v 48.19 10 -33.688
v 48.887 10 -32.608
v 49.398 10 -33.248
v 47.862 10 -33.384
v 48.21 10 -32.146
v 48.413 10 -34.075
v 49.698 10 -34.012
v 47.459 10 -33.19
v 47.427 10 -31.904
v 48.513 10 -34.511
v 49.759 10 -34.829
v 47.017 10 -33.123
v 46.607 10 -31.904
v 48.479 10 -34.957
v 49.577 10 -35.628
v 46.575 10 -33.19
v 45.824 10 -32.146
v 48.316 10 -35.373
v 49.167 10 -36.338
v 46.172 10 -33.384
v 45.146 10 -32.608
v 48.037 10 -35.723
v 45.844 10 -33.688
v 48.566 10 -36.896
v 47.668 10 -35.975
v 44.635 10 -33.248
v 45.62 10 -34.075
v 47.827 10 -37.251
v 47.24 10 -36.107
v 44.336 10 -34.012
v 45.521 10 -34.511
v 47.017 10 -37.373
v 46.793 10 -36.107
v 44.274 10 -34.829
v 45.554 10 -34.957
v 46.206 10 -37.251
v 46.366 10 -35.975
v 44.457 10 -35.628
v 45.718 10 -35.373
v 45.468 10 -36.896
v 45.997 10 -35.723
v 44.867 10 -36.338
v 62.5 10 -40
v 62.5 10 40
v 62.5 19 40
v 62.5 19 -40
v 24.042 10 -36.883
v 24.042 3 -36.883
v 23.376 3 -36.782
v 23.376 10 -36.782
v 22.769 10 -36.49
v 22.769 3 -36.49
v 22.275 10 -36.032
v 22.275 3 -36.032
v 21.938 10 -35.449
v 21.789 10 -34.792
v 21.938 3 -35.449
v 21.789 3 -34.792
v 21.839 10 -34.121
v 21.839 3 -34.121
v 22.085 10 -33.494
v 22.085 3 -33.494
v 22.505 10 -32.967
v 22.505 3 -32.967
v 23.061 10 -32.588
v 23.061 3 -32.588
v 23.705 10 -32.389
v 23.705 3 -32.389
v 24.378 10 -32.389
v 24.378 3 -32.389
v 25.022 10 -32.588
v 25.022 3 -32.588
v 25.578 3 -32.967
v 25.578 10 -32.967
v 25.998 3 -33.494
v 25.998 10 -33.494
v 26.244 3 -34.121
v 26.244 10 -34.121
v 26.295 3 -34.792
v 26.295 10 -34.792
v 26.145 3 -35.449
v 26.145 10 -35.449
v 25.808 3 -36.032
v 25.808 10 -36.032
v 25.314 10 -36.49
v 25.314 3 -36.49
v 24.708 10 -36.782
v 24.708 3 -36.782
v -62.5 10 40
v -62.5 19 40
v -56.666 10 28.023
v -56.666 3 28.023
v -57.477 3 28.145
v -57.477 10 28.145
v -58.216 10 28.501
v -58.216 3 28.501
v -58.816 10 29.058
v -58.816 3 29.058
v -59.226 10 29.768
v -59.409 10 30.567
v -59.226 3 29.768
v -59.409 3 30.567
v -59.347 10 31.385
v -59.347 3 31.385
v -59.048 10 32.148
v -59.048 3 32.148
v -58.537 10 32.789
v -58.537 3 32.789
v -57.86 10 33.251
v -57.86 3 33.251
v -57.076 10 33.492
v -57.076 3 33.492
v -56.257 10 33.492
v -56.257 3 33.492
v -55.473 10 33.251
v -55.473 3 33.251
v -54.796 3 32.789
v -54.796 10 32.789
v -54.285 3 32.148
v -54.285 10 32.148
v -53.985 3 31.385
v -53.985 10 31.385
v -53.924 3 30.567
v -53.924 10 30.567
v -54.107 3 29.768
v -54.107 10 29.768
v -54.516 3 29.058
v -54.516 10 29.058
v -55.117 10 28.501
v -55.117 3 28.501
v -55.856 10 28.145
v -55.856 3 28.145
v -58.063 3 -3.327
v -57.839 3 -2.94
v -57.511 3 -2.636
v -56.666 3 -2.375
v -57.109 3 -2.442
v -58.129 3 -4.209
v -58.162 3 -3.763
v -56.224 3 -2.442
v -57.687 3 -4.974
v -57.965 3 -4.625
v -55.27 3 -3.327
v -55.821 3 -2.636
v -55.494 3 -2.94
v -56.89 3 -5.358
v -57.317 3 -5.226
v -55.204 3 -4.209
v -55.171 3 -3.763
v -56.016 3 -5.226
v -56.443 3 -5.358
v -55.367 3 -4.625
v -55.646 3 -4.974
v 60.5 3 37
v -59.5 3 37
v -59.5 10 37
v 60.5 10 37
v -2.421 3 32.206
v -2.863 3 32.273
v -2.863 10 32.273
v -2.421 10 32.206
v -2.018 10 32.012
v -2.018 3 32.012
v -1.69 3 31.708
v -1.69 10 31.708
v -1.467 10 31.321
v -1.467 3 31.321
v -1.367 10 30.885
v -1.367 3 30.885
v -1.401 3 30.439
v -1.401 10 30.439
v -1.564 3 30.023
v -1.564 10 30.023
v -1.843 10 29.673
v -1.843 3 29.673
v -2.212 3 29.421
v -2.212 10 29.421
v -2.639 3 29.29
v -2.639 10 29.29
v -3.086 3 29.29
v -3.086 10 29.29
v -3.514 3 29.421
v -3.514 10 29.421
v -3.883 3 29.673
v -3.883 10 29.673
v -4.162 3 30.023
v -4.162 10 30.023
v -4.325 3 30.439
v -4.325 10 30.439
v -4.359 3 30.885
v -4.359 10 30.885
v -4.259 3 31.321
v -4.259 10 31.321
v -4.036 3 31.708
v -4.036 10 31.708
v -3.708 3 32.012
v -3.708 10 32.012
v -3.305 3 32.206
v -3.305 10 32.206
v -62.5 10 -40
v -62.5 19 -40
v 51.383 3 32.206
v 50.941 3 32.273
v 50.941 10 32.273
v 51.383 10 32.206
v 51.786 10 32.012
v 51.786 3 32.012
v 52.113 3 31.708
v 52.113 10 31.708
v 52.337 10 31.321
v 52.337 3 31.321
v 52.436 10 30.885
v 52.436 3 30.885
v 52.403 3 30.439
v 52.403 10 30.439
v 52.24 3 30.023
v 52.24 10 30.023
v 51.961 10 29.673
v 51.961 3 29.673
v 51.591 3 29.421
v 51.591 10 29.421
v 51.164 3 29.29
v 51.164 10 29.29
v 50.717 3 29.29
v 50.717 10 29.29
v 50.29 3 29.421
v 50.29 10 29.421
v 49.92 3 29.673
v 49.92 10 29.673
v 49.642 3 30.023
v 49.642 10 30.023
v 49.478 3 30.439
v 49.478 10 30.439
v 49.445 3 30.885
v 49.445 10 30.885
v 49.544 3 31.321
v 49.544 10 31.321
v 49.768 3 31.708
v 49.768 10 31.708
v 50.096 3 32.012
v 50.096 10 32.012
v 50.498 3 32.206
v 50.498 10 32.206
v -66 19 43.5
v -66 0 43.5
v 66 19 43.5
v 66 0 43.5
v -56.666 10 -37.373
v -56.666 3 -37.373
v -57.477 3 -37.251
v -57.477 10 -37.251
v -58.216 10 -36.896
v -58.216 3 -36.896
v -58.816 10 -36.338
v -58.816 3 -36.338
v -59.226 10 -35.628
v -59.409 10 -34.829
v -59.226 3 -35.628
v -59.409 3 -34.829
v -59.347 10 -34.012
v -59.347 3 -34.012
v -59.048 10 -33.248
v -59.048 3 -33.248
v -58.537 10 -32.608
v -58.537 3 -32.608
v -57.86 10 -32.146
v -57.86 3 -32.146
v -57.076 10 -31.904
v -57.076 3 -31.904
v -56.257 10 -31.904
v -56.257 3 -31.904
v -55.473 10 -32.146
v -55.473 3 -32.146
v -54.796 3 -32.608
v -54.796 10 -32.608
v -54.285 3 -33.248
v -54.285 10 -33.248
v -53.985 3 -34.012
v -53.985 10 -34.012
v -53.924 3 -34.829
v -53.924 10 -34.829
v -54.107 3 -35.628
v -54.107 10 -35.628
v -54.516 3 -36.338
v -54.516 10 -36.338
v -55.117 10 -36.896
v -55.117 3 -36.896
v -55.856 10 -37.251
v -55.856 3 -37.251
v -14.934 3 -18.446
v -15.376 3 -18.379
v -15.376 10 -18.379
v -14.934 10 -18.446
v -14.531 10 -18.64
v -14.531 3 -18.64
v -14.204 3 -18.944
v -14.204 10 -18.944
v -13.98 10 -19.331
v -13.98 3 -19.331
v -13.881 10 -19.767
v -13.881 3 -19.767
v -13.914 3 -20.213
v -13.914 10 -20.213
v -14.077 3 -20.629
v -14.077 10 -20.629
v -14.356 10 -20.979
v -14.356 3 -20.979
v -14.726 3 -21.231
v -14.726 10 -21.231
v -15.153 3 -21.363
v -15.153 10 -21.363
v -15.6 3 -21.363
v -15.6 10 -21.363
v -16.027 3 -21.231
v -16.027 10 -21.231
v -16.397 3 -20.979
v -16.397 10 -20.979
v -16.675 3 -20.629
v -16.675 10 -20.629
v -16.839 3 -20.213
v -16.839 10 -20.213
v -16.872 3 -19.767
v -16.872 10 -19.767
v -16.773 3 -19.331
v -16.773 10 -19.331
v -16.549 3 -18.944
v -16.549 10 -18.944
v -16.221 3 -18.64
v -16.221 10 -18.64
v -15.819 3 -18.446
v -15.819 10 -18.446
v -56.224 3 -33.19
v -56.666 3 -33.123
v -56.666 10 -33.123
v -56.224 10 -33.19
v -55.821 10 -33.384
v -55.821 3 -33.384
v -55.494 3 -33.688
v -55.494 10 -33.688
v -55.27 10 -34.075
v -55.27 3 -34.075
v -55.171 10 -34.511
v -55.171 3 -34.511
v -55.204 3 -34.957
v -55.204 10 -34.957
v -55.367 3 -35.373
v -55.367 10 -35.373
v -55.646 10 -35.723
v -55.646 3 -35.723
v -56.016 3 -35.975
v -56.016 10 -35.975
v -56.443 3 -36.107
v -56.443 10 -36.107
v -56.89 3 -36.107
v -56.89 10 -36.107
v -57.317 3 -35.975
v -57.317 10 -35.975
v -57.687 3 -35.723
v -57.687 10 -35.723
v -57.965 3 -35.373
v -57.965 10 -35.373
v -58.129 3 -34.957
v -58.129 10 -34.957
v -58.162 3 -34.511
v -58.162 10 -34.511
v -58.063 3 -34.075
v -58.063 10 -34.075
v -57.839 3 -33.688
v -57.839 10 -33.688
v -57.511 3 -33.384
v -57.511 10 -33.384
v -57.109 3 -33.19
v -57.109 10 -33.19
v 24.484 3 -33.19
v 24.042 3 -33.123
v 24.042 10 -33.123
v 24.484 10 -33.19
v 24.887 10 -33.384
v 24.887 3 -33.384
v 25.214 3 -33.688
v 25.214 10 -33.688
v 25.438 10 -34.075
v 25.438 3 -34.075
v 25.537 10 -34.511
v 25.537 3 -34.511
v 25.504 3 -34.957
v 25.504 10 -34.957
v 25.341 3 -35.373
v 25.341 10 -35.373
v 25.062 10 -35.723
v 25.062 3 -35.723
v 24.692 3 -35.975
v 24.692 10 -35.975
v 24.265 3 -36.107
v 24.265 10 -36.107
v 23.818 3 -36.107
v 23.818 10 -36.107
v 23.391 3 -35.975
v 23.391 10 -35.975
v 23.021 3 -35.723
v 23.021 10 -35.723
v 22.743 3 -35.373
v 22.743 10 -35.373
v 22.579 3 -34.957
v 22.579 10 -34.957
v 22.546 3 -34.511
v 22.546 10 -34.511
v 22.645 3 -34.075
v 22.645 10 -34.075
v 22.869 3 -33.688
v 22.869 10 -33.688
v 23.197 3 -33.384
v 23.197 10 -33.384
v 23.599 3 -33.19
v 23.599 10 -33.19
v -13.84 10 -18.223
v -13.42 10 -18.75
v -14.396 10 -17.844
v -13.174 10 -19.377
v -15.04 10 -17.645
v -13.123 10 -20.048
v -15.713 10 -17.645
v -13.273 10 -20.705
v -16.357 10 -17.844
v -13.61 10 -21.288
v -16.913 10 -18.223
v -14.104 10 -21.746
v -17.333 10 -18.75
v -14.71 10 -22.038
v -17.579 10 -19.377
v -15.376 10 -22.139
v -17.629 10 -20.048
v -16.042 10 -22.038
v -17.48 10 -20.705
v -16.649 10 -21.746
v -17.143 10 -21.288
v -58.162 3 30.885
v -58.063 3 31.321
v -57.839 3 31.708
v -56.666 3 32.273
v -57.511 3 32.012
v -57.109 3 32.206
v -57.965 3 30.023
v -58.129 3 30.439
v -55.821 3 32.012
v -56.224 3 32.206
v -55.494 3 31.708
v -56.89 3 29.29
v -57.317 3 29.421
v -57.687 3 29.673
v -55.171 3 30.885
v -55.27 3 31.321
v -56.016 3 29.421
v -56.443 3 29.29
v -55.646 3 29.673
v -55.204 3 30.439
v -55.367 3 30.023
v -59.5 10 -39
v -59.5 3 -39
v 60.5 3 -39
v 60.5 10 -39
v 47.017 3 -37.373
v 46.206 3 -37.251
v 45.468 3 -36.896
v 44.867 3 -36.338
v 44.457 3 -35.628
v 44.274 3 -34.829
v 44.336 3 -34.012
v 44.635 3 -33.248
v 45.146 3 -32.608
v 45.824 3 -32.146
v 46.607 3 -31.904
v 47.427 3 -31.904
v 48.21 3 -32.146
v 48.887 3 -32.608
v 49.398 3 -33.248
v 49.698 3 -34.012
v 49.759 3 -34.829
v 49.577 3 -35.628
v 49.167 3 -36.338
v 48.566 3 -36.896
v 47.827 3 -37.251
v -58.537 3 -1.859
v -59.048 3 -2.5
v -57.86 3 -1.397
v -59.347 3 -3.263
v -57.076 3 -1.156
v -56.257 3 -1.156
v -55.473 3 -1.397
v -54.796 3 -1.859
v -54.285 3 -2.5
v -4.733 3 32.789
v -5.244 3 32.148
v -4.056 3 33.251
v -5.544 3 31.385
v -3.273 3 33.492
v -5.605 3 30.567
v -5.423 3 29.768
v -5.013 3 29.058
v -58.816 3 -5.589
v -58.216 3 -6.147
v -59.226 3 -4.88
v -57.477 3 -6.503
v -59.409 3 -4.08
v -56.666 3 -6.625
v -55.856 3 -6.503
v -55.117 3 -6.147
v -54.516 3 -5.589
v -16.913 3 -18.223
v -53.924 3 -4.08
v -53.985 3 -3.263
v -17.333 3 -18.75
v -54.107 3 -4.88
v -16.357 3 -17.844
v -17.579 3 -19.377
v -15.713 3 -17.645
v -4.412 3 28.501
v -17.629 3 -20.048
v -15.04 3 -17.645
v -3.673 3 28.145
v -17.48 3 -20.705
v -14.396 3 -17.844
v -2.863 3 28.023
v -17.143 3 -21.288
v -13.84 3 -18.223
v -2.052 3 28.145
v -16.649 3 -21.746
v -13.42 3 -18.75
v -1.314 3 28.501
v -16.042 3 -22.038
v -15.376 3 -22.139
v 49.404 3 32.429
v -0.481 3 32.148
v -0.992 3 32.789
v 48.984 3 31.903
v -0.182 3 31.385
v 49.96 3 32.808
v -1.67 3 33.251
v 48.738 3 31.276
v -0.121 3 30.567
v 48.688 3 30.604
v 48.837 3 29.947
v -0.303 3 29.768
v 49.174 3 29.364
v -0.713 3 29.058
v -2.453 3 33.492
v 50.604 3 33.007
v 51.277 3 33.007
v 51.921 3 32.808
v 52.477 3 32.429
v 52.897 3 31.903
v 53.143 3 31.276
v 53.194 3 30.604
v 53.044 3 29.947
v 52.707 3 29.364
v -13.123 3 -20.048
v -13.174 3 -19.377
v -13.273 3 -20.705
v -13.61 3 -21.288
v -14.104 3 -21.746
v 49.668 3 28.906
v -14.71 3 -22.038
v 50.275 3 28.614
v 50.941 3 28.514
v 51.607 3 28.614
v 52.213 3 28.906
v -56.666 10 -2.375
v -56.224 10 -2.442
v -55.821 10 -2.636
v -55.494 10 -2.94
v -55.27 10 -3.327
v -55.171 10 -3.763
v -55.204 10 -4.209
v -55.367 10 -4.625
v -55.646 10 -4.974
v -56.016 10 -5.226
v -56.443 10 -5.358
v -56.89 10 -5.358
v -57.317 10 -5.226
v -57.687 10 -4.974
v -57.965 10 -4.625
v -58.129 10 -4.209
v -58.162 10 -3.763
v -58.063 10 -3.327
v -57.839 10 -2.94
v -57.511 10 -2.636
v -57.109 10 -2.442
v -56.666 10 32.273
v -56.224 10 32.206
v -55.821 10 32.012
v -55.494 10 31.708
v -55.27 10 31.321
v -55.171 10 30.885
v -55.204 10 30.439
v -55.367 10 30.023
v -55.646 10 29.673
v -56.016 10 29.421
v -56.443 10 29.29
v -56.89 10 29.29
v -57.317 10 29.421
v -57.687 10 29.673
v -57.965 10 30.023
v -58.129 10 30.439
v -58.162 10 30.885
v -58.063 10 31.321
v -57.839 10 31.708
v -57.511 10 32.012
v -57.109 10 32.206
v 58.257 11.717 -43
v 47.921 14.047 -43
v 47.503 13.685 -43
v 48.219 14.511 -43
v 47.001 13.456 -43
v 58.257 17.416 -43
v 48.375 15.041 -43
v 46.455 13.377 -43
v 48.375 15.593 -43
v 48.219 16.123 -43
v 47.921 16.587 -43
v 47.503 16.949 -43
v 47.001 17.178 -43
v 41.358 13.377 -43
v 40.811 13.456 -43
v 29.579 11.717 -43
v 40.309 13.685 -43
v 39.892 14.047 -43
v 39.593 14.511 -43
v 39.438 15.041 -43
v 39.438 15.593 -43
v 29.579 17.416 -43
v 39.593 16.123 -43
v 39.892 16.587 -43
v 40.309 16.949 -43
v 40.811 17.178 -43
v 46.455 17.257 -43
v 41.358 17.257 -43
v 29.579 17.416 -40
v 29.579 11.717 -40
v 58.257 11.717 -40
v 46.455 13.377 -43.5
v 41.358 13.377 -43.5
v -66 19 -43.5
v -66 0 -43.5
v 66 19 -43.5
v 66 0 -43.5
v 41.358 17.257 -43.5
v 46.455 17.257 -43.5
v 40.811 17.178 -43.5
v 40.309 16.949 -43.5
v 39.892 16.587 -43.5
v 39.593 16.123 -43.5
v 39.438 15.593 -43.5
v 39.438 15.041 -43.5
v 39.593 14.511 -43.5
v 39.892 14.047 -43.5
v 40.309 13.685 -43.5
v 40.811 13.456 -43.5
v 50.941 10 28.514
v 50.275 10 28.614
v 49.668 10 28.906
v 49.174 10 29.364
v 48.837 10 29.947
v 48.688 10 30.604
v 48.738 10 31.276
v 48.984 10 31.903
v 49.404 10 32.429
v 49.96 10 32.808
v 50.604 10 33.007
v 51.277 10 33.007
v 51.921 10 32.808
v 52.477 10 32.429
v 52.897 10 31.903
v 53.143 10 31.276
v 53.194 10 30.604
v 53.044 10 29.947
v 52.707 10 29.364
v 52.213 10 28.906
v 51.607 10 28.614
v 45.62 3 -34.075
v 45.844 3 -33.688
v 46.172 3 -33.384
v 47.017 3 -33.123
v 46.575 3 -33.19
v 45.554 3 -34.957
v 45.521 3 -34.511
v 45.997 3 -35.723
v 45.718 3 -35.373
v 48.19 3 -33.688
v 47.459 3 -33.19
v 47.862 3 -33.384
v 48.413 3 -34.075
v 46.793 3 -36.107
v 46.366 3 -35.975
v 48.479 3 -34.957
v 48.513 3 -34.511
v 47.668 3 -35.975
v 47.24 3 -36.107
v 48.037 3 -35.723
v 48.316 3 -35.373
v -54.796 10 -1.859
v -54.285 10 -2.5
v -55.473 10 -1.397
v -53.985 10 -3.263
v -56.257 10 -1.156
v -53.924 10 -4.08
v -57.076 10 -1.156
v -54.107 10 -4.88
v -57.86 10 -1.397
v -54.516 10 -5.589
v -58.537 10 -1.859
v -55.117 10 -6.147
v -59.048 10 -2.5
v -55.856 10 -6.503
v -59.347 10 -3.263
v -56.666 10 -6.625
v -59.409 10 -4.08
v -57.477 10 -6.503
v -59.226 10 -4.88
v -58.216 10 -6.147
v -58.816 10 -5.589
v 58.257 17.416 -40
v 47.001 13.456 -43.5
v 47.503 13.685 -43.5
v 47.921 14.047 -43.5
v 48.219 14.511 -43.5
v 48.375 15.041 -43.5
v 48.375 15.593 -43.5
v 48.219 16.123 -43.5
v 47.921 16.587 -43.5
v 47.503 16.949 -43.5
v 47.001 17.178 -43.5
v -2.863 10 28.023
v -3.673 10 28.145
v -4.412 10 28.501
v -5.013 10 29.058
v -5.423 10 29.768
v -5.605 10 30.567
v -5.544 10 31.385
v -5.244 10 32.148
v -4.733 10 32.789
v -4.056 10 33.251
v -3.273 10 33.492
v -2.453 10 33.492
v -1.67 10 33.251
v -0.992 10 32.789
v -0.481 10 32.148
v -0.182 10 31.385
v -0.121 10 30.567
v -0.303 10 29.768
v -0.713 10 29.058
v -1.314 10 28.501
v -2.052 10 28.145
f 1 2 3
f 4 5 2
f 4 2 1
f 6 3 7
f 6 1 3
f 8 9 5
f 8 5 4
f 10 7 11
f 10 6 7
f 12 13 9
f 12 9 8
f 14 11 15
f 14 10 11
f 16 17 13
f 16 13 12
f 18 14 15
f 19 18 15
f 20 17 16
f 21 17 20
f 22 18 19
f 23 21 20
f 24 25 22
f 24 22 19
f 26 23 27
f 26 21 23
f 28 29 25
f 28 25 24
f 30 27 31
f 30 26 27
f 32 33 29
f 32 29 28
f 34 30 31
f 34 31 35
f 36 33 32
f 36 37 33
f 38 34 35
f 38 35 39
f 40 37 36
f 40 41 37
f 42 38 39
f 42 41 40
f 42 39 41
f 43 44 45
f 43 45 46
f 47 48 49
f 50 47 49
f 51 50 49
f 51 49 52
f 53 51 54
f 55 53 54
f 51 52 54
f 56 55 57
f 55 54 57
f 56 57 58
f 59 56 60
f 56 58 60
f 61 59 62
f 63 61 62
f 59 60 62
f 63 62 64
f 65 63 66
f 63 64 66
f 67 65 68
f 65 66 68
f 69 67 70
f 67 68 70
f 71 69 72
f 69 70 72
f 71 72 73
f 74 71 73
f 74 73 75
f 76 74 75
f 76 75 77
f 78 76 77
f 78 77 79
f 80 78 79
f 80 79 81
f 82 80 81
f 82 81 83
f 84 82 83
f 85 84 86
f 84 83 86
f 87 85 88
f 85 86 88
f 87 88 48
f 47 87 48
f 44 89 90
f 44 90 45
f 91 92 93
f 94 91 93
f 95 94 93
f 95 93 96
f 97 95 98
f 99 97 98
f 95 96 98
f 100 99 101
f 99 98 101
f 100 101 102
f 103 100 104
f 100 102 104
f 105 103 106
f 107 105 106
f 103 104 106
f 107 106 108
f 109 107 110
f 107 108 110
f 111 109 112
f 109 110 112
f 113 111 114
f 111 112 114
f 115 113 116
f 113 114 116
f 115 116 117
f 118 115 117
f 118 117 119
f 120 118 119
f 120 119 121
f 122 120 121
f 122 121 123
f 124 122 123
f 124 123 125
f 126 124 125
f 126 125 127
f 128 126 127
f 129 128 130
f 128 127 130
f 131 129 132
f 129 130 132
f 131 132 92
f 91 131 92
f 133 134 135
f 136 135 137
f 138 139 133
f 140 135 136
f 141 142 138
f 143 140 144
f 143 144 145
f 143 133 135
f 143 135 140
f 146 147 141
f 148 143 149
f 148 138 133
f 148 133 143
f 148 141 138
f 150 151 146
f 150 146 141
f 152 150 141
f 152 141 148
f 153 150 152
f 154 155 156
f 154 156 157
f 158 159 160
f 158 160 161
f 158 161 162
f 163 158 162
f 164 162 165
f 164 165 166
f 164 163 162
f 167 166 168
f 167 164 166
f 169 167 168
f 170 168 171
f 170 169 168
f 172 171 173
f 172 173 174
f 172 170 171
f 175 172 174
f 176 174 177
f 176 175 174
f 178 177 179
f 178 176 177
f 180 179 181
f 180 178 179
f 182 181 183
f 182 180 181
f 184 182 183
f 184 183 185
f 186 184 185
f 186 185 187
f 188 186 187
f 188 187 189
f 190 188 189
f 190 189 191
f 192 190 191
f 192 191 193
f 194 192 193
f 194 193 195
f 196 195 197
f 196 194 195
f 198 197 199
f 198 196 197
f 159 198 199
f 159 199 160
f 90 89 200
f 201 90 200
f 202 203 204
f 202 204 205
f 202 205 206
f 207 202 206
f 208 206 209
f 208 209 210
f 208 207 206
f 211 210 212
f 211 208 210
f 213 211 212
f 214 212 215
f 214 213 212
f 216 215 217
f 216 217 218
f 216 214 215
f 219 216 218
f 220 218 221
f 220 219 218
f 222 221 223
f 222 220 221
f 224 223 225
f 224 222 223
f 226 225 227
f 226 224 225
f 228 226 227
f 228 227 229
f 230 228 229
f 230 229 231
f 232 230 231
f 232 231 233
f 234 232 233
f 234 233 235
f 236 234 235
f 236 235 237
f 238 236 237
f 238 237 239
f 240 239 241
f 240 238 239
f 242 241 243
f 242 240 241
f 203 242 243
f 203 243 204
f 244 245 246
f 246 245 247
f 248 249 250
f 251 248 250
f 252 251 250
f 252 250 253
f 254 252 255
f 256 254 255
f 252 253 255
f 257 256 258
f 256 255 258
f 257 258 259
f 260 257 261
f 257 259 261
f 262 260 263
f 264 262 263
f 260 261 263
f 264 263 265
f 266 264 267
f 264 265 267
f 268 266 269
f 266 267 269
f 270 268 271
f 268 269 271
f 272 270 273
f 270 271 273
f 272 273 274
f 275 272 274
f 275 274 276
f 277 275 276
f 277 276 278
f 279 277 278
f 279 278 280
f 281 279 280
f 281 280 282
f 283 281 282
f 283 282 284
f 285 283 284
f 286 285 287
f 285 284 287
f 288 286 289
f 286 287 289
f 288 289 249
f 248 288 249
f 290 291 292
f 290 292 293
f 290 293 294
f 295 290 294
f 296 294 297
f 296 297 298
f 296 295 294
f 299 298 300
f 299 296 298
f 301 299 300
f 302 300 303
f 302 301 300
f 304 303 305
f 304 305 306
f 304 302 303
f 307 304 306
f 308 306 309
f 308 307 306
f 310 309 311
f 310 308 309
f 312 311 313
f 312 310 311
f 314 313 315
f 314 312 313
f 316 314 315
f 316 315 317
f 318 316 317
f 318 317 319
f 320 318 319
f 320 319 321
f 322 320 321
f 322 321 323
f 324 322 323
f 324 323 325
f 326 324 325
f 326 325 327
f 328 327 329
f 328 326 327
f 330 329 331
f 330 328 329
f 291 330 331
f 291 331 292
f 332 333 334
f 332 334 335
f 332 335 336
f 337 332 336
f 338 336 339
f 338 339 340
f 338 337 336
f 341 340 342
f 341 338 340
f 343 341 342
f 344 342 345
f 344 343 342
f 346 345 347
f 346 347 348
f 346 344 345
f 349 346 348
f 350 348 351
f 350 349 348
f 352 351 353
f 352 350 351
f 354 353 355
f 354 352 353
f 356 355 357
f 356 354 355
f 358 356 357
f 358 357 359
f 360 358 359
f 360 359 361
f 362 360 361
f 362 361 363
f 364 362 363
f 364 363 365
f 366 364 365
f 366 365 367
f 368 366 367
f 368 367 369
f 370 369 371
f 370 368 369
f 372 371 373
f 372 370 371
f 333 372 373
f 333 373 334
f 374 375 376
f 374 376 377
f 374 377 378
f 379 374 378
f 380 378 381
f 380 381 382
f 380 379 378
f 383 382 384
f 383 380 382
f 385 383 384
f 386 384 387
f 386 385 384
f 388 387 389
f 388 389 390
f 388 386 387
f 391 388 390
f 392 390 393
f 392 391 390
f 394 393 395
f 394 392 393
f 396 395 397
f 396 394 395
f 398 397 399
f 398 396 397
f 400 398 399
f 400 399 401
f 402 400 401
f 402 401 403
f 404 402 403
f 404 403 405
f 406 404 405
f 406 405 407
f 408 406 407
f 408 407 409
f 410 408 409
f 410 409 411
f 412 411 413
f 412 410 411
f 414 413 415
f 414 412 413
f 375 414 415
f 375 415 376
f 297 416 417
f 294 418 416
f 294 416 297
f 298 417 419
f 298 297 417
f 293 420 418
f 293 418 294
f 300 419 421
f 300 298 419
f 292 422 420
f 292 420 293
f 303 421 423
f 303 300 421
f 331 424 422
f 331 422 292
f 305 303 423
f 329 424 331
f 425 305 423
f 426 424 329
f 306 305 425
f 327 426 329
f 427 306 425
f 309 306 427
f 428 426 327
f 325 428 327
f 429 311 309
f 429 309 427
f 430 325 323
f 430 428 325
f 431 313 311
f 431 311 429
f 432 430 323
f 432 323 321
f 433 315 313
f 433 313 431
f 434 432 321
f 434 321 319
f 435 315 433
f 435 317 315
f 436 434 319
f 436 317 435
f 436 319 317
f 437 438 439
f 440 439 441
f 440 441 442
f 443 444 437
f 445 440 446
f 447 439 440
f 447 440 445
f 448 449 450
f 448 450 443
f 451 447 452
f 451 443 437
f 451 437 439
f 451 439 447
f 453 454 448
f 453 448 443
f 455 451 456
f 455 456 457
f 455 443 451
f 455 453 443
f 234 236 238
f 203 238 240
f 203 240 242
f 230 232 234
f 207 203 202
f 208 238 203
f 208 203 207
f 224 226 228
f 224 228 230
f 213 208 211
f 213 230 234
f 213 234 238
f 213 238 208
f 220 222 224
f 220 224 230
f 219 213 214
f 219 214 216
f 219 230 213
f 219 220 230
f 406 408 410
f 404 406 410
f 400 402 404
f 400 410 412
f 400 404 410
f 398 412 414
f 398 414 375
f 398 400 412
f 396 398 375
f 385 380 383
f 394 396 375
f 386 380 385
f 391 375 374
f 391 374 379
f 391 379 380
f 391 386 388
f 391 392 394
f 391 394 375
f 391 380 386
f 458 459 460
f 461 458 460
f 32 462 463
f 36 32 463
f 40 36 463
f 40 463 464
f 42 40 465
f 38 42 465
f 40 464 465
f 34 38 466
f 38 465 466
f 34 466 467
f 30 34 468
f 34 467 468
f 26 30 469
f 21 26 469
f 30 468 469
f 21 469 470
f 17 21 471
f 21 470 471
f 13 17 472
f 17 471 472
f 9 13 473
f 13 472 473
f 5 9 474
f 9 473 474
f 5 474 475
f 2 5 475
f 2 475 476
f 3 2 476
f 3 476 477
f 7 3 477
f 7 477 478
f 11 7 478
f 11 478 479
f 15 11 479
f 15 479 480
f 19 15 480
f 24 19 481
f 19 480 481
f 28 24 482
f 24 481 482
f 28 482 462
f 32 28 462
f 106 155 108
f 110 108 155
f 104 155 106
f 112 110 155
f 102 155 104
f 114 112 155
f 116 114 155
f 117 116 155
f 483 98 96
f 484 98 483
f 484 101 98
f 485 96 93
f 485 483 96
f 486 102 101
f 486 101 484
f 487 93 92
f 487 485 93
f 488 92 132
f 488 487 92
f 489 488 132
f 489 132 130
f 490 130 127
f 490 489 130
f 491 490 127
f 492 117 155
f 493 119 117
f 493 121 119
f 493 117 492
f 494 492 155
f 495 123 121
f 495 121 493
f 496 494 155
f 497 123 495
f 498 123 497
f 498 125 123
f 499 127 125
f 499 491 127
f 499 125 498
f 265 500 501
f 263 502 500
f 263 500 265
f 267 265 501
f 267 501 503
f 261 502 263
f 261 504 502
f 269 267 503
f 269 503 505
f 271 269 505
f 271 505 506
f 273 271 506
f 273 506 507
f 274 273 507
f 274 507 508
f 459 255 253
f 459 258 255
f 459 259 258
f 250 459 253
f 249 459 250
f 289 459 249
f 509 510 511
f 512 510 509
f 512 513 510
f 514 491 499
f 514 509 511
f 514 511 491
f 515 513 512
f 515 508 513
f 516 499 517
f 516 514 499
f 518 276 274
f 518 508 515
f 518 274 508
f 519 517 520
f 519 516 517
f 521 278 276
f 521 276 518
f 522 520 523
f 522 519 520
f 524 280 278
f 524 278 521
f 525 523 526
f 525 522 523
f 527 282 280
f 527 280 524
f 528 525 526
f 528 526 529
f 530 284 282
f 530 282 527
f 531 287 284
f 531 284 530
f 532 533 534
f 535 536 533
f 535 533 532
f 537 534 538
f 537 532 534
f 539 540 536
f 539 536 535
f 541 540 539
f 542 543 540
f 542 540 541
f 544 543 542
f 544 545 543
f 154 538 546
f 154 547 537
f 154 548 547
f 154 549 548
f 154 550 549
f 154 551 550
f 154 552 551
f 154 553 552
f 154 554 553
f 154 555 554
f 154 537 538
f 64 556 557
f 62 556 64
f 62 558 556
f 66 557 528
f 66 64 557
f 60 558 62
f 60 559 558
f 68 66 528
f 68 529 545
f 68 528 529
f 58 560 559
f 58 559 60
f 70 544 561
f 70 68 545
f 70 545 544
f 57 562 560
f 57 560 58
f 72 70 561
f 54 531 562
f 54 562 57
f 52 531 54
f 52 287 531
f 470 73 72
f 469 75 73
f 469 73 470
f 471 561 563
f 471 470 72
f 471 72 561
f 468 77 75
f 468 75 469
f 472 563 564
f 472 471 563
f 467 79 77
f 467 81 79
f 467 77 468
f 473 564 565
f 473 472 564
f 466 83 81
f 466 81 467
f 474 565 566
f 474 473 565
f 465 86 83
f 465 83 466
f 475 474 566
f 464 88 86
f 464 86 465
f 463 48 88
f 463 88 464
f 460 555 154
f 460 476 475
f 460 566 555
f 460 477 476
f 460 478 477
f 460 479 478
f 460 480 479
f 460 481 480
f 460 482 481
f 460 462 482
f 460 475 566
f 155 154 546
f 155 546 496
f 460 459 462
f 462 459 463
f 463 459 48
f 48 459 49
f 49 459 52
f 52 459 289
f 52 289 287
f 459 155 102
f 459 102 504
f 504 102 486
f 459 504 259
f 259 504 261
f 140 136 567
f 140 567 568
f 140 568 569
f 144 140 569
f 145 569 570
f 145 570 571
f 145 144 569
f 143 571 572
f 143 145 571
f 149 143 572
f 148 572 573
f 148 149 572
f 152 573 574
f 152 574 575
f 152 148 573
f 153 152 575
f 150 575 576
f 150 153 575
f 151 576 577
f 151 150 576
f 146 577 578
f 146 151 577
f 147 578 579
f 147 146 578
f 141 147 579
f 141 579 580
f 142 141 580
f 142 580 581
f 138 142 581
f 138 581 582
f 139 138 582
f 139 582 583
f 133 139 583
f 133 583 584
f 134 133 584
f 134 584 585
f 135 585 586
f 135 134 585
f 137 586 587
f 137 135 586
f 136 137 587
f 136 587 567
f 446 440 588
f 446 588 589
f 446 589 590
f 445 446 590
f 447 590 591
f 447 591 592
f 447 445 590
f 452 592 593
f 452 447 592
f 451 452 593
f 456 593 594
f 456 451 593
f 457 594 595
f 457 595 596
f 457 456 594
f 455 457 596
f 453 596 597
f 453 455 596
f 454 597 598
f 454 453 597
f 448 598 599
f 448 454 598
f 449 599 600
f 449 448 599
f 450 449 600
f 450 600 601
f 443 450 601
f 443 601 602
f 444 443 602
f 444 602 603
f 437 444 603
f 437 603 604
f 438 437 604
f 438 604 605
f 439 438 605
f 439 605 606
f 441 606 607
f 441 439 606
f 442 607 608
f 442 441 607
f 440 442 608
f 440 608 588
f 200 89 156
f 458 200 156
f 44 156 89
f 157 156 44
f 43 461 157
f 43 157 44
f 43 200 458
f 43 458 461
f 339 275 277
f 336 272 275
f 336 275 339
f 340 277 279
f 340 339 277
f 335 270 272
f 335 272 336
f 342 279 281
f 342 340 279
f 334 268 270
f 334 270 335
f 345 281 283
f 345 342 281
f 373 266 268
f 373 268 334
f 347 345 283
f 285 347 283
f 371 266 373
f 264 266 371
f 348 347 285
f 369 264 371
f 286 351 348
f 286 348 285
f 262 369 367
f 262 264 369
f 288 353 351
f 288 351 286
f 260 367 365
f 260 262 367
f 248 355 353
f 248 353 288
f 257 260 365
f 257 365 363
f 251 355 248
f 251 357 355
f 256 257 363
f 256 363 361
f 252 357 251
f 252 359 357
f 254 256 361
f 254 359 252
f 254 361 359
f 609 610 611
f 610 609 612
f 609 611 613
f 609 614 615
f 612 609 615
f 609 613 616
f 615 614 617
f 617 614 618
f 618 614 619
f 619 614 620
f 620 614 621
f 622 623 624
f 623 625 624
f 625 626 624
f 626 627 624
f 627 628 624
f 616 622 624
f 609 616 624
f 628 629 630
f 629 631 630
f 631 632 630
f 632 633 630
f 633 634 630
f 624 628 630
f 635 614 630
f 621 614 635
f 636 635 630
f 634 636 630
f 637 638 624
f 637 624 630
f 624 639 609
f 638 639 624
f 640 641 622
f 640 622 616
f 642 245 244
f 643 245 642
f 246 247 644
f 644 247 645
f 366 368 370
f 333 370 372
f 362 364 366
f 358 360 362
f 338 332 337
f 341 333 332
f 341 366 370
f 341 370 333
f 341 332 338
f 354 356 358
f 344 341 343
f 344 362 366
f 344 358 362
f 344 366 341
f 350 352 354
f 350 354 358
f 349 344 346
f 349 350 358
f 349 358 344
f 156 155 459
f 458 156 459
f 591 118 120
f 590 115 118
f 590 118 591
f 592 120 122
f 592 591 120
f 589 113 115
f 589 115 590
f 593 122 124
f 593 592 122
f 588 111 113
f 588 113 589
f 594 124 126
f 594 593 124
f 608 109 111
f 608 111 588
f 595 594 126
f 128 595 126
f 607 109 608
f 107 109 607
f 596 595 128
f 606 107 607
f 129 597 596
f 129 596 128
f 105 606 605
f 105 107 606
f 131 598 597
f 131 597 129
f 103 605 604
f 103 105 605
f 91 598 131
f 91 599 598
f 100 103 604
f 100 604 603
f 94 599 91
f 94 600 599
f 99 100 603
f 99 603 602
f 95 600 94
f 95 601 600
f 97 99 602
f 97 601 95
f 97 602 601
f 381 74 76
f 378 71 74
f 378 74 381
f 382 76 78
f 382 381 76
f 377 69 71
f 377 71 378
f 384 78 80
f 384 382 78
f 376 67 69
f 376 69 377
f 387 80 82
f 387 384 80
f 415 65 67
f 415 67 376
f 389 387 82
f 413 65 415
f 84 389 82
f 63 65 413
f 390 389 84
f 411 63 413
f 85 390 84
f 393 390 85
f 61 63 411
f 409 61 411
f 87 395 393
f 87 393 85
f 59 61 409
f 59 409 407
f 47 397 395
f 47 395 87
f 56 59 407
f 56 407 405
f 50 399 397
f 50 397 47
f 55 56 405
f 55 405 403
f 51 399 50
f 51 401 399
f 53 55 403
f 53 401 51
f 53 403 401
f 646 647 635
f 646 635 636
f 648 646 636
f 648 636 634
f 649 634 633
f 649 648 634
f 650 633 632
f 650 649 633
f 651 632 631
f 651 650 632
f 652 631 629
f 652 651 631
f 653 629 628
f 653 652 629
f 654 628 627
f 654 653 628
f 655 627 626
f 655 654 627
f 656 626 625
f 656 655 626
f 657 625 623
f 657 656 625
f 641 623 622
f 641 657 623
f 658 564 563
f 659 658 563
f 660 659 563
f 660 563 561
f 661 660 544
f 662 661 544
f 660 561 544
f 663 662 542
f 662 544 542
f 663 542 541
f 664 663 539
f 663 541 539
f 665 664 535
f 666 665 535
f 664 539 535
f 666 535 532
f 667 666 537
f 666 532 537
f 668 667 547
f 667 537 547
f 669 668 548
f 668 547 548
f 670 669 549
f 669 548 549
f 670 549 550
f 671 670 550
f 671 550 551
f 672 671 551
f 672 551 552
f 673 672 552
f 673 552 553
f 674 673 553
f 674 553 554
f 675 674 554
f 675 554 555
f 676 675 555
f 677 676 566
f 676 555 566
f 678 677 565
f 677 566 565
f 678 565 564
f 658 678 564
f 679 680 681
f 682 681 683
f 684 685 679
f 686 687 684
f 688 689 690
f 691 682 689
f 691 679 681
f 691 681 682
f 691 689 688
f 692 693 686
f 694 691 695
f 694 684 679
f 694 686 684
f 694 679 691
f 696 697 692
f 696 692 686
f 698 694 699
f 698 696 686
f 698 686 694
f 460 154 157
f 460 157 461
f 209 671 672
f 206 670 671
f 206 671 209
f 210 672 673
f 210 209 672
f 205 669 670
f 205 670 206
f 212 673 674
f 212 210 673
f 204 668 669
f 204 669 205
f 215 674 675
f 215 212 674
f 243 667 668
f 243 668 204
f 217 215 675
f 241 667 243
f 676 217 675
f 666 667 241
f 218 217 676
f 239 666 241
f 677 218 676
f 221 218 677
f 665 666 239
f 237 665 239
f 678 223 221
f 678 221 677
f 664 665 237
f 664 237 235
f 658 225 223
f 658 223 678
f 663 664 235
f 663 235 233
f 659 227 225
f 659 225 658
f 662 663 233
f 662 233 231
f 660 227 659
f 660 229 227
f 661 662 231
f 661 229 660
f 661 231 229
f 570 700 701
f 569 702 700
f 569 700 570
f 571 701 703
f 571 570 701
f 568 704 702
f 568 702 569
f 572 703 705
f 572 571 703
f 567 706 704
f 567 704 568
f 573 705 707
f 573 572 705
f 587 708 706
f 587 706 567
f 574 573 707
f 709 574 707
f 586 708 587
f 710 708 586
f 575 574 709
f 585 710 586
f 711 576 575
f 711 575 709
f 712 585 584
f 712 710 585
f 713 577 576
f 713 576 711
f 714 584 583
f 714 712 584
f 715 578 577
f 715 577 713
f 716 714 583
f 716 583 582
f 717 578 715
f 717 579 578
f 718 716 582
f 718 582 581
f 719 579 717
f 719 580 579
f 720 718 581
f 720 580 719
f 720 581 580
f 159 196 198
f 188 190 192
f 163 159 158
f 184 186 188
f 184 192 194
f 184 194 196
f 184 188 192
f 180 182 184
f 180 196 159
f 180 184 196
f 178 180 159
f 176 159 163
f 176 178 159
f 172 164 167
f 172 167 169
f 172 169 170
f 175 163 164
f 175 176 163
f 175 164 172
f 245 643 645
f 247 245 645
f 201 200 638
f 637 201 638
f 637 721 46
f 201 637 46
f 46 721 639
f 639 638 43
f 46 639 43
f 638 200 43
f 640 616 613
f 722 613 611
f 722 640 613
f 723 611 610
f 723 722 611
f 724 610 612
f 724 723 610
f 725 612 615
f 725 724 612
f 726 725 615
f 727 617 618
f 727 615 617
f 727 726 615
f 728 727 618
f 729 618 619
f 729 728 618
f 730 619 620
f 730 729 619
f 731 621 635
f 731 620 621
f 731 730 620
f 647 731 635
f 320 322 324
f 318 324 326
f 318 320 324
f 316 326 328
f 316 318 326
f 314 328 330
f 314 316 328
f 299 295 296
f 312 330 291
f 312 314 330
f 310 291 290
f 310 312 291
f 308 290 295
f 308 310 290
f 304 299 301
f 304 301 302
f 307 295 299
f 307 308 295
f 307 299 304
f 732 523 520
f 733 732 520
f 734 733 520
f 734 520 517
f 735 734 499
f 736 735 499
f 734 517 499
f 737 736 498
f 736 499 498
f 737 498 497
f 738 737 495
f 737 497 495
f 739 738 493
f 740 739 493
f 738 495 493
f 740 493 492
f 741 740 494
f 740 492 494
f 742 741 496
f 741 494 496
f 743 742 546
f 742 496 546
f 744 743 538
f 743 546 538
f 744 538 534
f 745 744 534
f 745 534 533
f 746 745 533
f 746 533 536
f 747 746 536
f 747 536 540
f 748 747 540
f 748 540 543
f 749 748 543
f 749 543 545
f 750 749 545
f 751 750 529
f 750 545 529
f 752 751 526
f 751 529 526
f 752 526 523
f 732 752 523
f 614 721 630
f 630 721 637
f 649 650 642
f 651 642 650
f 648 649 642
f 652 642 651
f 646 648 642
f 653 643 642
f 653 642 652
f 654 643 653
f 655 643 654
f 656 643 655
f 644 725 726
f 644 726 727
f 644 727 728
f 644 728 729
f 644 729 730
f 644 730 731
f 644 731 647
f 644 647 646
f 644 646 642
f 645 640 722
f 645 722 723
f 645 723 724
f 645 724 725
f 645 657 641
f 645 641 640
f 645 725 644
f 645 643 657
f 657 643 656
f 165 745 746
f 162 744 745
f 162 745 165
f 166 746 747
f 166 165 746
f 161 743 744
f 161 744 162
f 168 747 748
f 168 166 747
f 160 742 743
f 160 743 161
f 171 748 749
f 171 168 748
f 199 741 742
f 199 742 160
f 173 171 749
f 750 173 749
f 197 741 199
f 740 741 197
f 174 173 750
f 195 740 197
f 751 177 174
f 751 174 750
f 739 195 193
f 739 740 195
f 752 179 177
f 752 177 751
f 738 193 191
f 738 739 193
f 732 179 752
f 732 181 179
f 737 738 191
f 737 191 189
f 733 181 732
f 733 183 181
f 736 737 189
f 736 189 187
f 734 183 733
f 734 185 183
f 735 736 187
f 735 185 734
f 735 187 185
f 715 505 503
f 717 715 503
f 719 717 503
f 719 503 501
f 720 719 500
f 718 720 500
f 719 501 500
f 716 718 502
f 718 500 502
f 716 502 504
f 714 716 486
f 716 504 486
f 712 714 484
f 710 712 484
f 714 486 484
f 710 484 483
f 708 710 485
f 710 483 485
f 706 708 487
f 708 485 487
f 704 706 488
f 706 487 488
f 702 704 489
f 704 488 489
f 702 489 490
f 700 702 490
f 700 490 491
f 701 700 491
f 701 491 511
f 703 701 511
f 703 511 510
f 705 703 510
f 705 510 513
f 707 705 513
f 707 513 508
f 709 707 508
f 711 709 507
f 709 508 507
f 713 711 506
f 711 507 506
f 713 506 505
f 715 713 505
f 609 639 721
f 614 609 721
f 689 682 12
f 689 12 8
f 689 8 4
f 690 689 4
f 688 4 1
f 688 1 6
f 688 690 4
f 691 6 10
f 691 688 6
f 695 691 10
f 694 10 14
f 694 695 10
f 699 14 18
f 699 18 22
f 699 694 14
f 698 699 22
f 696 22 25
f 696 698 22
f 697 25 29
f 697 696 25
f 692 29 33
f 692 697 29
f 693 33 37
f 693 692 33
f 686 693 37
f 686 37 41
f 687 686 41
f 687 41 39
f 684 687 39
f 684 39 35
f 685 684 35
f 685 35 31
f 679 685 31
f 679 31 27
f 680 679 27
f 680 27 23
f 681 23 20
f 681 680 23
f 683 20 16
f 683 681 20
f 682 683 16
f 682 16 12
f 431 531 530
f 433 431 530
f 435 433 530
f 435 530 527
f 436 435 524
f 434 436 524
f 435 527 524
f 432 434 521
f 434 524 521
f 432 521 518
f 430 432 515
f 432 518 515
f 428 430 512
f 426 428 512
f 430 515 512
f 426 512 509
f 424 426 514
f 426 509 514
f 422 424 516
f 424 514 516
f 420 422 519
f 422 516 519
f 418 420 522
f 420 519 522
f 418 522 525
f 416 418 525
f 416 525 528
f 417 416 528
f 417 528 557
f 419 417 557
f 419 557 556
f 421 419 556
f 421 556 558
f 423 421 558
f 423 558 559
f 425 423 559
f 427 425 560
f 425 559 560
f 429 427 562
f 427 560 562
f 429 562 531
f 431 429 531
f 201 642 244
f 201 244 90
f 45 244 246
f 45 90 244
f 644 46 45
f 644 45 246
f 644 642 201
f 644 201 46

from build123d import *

# Parameters (mm, degrees)
SKETCH1_W           = 125
SKETCH1_H           = 80
BOSS_EXTRUDE1_DEPTH = 3
SKETCH1_3_W         = 132
SKETCH1_3_H         = 87
SKETCH1_3_W_2       = 125
SKETCH1_3_H_2       = 80
BOSS_EXTRUDE2_DEPTH = 19
SKETCH2_W           = 125
SKETCH2_H           = 80
SKETCH2_W_2         = 120
SKETCH2_H_2         = 76
BOSS_EXTRUDE3_DEPTH = 10
SKETCH3_W           = 28.6783421
SKETCH3_H           = 5.698707123
CUT_EXTRUDE1_DEPTH  = 3
CUT_EXTRUDE2_DEPTH  = 3
SKETCH5_R           = 2.75
SKETCH5_R_2         = 1.5
SKETCH5_R_3         = 2.259305414
BOSS_EXTRUDE4_DEPTH = 7


with BuildPart() as part:
    # Sketch1 → Boss-Extrude1 (new body)
    with BuildSketch(Plane(origin=(0, 0, 0), x_dir=(1, 0, 0), z_dir=(0, 1, 0))):
        Rectangle(SKETCH1_W, SKETCH1_H)
    extrude(amount=BOSS_EXTRUDE1_DEPTH)

    # Sketch1<3> → Boss-Extrude2 (add)
    with BuildSketch(Plane(origin=(0, 0, 0), x_dir=(1, 0, 0), z_dir=(0, 1, 0))):
        Rectangle(SKETCH1_3_W, SKETCH1_3_H)
        Rectangle(SKETCH1_3_W_2, SKETCH1_3_H_2, mode=Mode.SUBTRACT)
    extrude(amount=BOSS_EXTRUDE2_DEPTH)

    # Sketch2 → Boss-Extrude3 (add)
    with BuildSketch(Plane(origin=(0, 0, 0), x_dir=(1, 0, 0), z_dir=(0, 1, 0))):
        Rectangle(SKETCH2_W, SKETCH2_H)
        with Locations((0.5, 1)):
            Rectangle(SKETCH2_W_2, SKETCH2_H_2, mode=Mode.SUBTRACT)
    extrude(amount=BOSS_EXTRUDE3_DEPTH)

    # Sketch3 → Cut-Extrude1 (cut)
    with BuildSketch(Plane(origin=(0, 0, -40), x_dir=(-1, 0, 0), z_dir=(0, 0, -1))):
        with Locations((-43.918315426, 14.566401795)):
            Rectangle(SKETCH3_W, SKETCH3_H)
    extrude(amount=CUT_EXTRUDE1_DEPTH, mode=Mode.SUBTRACT)

    # Sketch4 → Cut-Extrude2 (cut)
    with BuildSketch(Plane(origin=(0, 0, -43.5), x_dir=(-1, 0, 0), z_dir=(0, 0, -1))):
        with BuildLine():
            Line((-46.454793207, 17.25655779), (-41.357520978, 17.25655779))
            ThreePointArc((-41.357520978, 17.25655779), (-39.417949113, 15.316985924), (-41.357520978, 13.377414059))
            Line((-41.357520978, 13.377414059), (-46.454793207, 13.377414059))
            ThreePointArc((-46.454793207, 13.377414059), (-48.394365073, 15.316985924), (-46.454793207, 17.25655779))
        make_face()
    extrude(amount=-CUT_EXTRUDE2_DEPTH, mode=Mode.SUBTRACT)

    # Sketch5 → Boss-Extrude4 (add)
    # profile 1 of 8: a face of its own
    with BuildSketch(Plane(origin=(0, 3, 0), x_dir=(1, 0, 0), z_dir=(0, 1, 0))):
        with Locations((-56.666408857, -30.772899219)):
            Circle(SKETCH5_R)
        with Locations((-56.666408857, -30.772899219)):
            Circle(SKETCH5_R_2, mode=Mode.SUBTRACT)
    # profile 2 of 8: a face of its own
    with BuildSketch(Plane(origin=(0, 3, 0), x_dir=(1, 0, 0), z_dir=(0, 1, 0))):
        with Locations((-56.666408857, 34.623451832)):
            Circle(SKETCH5_R)
        with Locations((-56.666408857, 34.623451832)):
            Circle(SKETCH5_R_2, mode=Mode.SUBTRACT)
    # profile 3 of 8: a face of its own
    with BuildSketch(Plane(origin=(0, 3, 0), x_dir=(1, 0, 0), z_dir=(0, 1, 0))):
        with Locations((-56.666408857, 3.874879483)):
            Circle(SKETCH5_R)
        with Locations((-56.666408857, 3.874879483)):
            Circle(SKETCH5_R_2, mode=Mode.SUBTRACT)
    # profile 4 of 8: a face of its own
    with BuildSketch(Plane(origin=(0, 3, 0), x_dir=(1, 0, 0), z_dir=(0, 1, 0))):
        with Locations((-15.376408857, 19.879433801)):
            Circle(SKETCH5_R_3)
        with Locations((-15.376408857, 19.879433801)):
            Circle(SKETCH5_R_2, mode=Mode.SUBTRACT)
    # profile 5 of 8: a face of its own
    with BuildSketch(Plane(origin=(0, 3, 0), x_dir=(1, 0, 0), z_dir=(0, 1, 0))):
        with Locations((24.041591143, 34.623451832)):
            Circle(SKETCH5_R_3)
        with Locations((24.041591143, 34.623451832)):
            Circle(SKETCH5_R_2, mode=Mode.SUBTRACT)
    # profile 6 of 8: a face of its own
    with BuildSketch(Plane(origin=(0, 3, 0), x_dir=(1, 0, 0), z_dir=(0, 1, 0))):
        with Locations((50.940615446, -30.772899219)):
            Circle(SKETCH5_R_3)
        with Locations((50.940615446, -30.772899219)):
            Circle(SKETCH5_R_2, mode=Mode.SUBTRACT)
    # profile 7 of 8: a face of its own
    with BuildSketch(Plane(origin=(0, 3, 0), x_dir=(1, 0, 0), z_dir=(0, 1, 0))):
        with Locations((-2.862896706, -30.772899219)):
            Circle(SKETCH5_R)
        with Locations((-2.862896706, -30.772899219)):
            Circle(SKETCH5_R_2, mode=Mode.SUBTRACT)
    # profile 8 of 8: a face of its own
    with BuildSketch(Plane(origin=(0, 3, 0), x_dir=(1, 0, 0), z_dir=(0, 1, 0))):
        with Locations((47.016763874, 34.623451832)):
            Circle(SKETCH5_R)
        with Locations((47.016763874, 34.623451832)):
            Circle(SKETCH5_R_2, mode=Mode.SUBTRACT)
    extrude(amount=BOSS_EXTRUDE4_DEPTH)


solid = part.part
